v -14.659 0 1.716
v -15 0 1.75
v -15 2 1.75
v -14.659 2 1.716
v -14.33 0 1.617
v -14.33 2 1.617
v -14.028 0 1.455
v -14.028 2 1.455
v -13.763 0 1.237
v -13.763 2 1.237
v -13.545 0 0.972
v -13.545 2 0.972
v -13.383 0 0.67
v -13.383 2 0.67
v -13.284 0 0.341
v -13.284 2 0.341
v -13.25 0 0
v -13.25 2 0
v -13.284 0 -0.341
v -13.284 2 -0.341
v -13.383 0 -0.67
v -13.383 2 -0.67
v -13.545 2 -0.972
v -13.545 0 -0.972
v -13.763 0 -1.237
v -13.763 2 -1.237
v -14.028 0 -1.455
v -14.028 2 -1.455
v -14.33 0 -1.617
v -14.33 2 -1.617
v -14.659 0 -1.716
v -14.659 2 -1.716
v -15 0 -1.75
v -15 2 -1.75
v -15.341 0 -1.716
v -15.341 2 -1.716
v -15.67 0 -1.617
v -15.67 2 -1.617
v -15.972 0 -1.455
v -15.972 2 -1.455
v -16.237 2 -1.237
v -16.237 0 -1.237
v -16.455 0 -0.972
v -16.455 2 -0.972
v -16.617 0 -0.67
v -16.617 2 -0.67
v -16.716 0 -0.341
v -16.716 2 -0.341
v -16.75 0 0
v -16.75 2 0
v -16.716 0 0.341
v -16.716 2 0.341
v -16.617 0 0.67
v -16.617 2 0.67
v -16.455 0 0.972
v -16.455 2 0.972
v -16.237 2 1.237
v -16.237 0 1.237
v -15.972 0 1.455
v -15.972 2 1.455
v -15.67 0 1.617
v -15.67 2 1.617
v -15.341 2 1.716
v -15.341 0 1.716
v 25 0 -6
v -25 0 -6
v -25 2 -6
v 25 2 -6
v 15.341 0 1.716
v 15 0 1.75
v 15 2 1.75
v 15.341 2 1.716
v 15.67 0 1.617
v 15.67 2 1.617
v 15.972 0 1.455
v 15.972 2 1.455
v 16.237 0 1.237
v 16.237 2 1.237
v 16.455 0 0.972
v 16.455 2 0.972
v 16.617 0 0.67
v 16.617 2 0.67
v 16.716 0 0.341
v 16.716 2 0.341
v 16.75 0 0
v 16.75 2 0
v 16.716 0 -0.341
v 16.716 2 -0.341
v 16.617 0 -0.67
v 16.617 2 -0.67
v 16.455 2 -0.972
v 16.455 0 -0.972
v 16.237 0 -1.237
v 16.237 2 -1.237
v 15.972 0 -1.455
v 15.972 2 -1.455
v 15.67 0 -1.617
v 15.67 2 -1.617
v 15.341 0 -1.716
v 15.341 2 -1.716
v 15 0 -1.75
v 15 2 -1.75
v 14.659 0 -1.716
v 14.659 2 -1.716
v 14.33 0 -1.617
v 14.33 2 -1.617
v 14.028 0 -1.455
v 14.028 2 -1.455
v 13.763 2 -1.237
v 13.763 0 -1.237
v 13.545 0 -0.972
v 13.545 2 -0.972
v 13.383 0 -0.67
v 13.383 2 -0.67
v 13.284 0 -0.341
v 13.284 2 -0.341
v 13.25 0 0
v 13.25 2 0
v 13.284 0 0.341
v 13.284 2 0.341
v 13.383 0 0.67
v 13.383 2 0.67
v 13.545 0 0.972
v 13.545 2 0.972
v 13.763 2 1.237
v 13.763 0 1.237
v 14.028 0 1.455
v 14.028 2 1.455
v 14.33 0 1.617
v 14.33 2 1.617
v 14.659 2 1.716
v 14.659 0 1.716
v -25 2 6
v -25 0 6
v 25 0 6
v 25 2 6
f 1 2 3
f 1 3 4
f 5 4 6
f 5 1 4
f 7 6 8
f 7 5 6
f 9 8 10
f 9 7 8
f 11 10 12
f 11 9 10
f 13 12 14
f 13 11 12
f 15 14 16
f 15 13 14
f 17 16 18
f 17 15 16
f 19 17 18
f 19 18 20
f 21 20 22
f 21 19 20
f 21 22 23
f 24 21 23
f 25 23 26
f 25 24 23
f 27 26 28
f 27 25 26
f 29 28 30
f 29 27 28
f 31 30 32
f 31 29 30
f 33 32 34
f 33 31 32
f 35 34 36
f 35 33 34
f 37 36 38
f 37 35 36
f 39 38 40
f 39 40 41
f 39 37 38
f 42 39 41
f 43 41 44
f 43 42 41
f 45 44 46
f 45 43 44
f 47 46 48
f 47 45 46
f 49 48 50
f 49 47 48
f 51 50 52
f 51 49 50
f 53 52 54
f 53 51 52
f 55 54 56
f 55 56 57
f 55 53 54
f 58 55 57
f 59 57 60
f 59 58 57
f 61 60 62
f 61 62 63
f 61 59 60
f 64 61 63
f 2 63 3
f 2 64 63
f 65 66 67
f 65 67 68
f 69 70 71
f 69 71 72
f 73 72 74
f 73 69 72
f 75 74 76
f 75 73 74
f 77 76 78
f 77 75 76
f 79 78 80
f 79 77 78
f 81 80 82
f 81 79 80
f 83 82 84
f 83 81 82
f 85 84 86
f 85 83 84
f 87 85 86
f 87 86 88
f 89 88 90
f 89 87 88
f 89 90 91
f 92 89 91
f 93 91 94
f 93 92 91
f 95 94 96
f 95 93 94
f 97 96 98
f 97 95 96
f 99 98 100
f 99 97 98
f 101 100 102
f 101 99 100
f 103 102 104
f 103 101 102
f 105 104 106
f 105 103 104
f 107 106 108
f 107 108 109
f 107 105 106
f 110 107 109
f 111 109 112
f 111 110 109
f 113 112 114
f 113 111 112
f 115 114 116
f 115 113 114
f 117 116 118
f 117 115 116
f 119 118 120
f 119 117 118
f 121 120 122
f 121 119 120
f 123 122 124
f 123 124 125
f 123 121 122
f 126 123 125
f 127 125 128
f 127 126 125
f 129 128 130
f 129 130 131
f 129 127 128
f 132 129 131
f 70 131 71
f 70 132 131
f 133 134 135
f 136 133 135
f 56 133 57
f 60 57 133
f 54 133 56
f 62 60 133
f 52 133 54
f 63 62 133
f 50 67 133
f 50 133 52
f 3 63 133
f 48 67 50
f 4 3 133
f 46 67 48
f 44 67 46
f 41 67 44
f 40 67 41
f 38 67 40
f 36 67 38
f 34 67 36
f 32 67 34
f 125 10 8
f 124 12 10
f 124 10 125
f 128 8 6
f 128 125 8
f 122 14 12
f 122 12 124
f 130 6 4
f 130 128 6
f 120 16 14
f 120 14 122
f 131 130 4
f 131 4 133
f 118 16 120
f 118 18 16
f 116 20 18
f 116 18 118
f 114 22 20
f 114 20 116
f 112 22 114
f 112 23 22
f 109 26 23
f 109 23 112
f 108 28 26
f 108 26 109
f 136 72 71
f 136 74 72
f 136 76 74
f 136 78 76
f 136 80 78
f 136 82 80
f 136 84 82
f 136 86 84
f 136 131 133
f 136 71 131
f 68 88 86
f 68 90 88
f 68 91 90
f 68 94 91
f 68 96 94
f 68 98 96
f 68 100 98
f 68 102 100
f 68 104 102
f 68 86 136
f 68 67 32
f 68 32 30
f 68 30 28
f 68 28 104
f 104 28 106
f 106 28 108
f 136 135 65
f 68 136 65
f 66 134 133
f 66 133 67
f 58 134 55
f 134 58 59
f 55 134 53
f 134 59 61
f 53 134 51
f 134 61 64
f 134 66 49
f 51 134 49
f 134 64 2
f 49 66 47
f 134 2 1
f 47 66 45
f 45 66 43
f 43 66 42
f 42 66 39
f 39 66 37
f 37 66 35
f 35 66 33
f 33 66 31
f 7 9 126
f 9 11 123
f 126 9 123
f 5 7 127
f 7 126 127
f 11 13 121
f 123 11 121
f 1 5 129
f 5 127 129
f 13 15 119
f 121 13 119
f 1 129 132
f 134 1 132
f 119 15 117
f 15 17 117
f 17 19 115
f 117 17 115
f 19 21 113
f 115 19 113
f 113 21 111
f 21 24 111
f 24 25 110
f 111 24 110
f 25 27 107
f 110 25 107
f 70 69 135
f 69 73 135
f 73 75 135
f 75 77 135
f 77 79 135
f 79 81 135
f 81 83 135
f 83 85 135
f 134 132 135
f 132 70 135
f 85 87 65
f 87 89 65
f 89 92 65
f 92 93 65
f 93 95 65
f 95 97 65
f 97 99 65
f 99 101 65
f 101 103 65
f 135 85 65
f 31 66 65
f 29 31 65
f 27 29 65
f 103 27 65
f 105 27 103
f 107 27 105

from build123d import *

# Parameters (mm, degrees)
ESBO_O1_W                = 50
ESBO_O1_H                = 12
ESBO_O1_R                = 1.75
RESSALTO_EXTRUS_O1_DEPTH = 2


with BuildPart() as part:
    # Esboço1 → Ressalto-extrusão1 (new body)
    with BuildSketch(Plane(origin=(0, 0, 0), x_dir=(1, 0, 0), z_dir=(0, 1, 0))):
        Rectangle(ESBO_O1_W, ESBO_O1_H)
        with Locations(Location((-15, 0, 0), (0, 0, 270))):
            Circle(ESBO_O1_R, mode=Mode.SUBTRACT)
        with Locations(Location((15, 0, 0), (0, 0, 270))):
            Circle(ESBO_O1_R, mode=Mode.SUBTRACT)
    extrude(amount=RESSALTO_EXTRUS_O1_DEPTH)


solid = part.part
